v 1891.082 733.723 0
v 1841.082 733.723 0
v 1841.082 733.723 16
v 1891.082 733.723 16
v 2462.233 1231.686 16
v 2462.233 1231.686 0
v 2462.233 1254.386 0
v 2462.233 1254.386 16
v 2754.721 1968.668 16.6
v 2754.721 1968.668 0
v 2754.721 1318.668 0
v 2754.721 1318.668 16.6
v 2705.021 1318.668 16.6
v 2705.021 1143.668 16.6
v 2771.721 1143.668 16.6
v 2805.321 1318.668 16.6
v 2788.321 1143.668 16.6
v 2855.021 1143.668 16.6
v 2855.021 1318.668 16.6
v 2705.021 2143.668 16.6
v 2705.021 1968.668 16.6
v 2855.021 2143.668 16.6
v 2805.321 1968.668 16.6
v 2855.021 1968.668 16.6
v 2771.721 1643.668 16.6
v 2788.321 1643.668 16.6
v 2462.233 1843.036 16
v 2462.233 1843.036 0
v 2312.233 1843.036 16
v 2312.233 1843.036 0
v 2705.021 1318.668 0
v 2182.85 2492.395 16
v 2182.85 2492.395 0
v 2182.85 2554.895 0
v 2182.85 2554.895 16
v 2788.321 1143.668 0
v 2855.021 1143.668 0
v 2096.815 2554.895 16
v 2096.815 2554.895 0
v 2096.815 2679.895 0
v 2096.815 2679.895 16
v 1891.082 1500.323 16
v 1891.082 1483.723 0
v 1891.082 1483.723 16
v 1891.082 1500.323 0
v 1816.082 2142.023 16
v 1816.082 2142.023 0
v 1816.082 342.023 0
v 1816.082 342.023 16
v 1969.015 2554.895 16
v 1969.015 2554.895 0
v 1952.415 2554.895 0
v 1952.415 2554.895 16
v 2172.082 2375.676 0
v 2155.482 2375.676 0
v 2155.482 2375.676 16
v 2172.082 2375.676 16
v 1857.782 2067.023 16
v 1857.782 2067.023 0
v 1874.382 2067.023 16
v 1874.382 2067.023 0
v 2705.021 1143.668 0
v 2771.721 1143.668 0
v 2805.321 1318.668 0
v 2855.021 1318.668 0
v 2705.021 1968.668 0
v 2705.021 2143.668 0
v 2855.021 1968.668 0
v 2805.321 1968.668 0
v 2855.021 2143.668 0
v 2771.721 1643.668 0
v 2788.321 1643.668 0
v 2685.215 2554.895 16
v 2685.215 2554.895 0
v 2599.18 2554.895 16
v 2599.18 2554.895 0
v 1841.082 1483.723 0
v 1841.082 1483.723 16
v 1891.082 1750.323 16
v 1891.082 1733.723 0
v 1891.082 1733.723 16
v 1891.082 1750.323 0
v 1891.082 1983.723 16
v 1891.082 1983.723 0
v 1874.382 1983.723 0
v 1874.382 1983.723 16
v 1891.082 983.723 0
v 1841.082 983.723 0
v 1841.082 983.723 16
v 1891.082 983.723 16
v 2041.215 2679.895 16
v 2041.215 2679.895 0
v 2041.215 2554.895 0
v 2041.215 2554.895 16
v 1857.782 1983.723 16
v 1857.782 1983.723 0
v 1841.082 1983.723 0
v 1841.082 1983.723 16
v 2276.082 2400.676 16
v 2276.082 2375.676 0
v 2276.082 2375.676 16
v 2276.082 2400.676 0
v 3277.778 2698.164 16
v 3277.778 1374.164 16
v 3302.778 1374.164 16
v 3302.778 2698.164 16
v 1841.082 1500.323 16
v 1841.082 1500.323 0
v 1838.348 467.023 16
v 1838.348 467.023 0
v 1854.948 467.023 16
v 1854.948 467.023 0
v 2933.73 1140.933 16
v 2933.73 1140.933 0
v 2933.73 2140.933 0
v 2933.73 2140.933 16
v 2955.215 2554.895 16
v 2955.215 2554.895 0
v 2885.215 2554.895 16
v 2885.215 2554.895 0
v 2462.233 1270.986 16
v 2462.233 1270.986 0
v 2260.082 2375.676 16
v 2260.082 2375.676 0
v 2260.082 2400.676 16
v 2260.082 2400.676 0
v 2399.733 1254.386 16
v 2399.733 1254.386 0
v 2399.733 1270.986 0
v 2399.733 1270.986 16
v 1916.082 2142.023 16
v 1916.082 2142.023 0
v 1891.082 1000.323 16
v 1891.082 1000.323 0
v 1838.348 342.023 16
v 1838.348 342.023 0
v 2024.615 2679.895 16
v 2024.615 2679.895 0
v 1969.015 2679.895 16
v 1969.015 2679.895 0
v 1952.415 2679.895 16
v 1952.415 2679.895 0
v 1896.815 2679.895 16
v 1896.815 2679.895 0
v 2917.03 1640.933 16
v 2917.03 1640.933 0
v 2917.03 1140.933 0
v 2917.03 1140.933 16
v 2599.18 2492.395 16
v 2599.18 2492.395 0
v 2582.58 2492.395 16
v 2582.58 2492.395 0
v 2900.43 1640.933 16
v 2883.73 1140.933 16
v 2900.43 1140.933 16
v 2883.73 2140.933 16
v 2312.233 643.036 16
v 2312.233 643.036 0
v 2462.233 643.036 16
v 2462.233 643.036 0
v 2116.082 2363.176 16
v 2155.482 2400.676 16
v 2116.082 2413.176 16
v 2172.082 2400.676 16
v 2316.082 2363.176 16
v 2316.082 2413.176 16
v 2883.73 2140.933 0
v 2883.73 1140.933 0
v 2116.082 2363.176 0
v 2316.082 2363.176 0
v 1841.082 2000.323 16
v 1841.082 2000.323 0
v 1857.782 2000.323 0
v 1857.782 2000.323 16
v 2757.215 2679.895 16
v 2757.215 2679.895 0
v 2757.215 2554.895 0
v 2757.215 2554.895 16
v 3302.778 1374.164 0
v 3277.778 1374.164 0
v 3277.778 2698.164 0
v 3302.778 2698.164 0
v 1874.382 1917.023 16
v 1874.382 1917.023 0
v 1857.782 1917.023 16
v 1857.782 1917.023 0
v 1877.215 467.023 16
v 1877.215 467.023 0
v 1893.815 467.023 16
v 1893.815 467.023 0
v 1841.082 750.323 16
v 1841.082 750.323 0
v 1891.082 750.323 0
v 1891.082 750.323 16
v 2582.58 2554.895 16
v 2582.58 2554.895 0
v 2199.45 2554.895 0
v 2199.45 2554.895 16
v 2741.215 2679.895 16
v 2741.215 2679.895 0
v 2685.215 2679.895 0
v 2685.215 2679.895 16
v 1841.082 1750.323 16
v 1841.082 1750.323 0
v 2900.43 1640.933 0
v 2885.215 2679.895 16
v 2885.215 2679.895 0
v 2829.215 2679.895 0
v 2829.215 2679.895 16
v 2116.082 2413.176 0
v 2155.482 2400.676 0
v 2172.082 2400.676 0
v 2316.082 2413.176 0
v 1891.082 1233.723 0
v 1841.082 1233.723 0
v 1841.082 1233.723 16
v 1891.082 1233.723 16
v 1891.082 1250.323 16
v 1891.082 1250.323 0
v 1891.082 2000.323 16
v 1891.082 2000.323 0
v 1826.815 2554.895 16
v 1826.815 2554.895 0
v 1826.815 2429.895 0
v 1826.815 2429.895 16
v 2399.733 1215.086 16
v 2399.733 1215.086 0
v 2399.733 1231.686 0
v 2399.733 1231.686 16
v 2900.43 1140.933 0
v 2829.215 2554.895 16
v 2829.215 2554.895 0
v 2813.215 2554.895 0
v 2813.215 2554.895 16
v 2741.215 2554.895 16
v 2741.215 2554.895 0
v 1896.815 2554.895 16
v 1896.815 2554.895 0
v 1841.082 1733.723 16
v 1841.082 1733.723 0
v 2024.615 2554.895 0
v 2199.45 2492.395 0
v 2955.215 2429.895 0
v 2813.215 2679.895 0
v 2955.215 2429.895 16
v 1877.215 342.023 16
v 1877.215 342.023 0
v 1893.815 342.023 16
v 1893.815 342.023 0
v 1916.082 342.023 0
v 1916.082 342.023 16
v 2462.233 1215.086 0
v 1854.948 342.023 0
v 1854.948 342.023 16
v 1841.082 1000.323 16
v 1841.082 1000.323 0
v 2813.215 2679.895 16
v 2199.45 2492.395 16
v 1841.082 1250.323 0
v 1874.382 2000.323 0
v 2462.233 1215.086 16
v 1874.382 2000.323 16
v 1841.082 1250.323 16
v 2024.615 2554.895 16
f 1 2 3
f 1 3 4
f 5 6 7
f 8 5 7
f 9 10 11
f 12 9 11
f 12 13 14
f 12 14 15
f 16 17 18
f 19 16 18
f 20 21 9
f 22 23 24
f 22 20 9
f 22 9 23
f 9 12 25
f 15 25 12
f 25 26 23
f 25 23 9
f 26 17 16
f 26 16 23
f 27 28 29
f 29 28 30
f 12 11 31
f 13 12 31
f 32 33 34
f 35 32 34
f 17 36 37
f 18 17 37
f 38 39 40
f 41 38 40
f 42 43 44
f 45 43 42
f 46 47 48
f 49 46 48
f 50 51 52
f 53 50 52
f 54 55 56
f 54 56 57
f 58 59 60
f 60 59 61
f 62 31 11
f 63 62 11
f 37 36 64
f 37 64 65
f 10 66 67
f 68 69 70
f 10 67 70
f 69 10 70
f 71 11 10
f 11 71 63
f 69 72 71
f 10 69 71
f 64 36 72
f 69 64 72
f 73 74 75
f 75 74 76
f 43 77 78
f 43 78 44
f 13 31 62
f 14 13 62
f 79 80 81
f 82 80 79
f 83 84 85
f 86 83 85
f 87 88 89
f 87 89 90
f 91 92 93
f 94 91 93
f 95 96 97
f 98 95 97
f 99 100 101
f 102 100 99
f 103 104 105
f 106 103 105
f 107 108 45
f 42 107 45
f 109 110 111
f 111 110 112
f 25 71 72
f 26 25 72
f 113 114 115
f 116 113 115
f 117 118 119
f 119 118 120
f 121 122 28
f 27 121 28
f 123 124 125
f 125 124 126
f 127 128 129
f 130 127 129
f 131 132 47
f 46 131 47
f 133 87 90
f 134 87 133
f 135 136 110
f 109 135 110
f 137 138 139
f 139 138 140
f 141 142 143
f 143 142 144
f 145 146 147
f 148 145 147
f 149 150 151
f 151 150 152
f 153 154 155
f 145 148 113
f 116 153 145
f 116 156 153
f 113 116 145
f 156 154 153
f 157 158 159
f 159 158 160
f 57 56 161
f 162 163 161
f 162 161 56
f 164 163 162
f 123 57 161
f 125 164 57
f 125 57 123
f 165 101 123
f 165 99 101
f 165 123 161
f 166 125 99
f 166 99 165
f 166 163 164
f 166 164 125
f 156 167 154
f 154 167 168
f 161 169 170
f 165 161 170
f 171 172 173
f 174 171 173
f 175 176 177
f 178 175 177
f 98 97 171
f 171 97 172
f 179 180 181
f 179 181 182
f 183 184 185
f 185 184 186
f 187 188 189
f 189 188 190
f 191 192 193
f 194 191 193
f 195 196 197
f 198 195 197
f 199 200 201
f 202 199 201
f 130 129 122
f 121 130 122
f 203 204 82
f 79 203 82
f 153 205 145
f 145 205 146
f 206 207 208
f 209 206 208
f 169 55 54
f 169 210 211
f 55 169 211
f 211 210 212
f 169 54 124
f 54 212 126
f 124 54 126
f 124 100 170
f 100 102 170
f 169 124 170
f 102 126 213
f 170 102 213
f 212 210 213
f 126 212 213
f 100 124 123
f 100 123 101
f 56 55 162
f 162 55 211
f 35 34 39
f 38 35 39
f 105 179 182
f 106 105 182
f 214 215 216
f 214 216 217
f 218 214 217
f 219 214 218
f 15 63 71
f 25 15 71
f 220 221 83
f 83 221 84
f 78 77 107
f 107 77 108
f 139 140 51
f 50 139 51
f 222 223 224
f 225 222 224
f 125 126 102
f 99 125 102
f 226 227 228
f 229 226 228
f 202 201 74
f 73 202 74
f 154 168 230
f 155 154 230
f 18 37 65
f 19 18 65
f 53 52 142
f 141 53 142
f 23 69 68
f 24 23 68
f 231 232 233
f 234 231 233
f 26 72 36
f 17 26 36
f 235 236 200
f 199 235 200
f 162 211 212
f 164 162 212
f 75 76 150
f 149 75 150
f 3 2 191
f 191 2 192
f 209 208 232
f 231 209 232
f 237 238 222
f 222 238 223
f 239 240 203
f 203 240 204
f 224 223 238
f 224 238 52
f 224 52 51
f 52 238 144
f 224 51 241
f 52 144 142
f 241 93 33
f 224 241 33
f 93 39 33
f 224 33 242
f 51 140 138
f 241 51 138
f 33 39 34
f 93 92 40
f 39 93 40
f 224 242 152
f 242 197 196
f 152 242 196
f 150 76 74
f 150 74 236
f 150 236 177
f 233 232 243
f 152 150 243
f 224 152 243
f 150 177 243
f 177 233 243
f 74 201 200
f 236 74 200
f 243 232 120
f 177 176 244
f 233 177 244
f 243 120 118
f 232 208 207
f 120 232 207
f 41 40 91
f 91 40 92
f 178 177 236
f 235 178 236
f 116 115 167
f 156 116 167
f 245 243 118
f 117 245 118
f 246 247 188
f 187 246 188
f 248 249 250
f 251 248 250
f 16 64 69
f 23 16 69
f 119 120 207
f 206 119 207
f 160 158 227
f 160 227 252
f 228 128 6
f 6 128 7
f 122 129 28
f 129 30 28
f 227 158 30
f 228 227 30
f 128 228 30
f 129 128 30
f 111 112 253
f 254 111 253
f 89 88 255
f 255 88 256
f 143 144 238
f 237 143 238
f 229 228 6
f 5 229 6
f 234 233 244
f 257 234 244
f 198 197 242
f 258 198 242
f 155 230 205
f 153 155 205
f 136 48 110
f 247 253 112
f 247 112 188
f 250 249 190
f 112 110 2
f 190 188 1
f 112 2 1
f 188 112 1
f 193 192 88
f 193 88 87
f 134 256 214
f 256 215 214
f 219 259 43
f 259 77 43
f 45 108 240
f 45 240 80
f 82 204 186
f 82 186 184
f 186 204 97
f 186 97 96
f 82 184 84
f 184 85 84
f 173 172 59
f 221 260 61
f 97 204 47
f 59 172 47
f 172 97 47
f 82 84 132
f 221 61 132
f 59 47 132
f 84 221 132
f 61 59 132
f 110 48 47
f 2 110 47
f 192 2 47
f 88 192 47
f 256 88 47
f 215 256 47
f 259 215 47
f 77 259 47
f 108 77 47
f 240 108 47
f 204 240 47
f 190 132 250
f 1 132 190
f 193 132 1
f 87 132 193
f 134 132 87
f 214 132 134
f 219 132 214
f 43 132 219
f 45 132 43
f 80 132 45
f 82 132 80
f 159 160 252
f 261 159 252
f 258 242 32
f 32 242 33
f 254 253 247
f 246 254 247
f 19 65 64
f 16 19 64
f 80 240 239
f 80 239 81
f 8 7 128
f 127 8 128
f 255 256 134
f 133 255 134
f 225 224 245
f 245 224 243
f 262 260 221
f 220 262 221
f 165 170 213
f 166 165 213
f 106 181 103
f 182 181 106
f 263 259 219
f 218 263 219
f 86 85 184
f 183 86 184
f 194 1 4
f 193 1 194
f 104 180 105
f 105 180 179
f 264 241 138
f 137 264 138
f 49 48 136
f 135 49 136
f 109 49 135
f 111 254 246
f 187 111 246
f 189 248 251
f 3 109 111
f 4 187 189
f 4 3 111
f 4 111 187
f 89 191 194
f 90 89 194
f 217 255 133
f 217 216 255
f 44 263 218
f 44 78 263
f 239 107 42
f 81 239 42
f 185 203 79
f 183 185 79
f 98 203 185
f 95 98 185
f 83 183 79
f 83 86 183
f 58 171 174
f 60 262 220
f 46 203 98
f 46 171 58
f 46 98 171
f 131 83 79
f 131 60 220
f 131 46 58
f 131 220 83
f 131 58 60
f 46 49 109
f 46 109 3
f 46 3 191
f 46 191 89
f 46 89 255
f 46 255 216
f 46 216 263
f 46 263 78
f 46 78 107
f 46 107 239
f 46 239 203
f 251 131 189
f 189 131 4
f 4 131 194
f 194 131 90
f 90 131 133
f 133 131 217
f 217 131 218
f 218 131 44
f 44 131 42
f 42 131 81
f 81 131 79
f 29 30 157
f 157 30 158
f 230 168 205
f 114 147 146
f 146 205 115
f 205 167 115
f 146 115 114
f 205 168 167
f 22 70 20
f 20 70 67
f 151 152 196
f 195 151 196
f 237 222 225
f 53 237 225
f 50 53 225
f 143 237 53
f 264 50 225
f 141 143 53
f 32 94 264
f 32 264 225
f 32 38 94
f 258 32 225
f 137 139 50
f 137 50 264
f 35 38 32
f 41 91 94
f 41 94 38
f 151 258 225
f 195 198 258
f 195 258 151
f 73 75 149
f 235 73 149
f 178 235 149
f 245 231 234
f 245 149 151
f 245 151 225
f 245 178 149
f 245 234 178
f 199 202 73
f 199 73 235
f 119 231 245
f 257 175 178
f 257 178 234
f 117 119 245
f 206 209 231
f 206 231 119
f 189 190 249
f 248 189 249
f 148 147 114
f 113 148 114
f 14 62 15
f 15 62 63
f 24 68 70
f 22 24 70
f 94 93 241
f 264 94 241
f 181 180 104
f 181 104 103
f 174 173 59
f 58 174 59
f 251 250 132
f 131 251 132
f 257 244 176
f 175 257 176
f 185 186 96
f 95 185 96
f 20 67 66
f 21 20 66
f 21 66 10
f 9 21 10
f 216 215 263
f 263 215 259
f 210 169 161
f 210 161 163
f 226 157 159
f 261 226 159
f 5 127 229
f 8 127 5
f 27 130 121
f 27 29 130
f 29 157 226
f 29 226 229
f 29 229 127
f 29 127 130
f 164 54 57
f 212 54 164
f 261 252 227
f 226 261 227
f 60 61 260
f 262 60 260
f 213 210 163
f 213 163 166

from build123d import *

# Parameters (mm, degrees)
F2_DEPTH = 16
F1_W     = 200
F1_H     = 50
F1_W_2   = 16.6
F1_H_2   = 25
F1_W_3   = 16
F1_W_4   = 50
F1_H_3   = 16.6
F3_DEPTH = 16.6
F1_W_5   = 25
F1_H_4   = 1324
F4_DEPTH = 16


# Not quite as in the source:
# - a feature names something its author has since deleted; it is built from what else it names


with BuildPart() as f2:
    # F1 (on Top) → F2 (new body)
    with BuildSketch(Plane.XY):
        Polygon((1826.8150956472, 2554.895401001), (1826.8150956472, 2429.895401001), (2955.2150956472, 2429.895401001), (2955.2150956472, 2554.895401001), (2885.2150956472, 2554.895401001), (2885.2150956472, 2679.895401001), (2829.2150956472, 2679.895401001), (2829.2150956472, 2554.895401001), (2813.2150956472, 2554.895401001), (2813.2150956472, 2679.895401001), (2757.2150956472, 2679.895401001), (2757.2150956472, 2554.895401001), (2741.2150956472, 2554.895401001), (2741.2150956472, 2679.895401001), (2685.2150956472, 2679.895401001), (2685.2150956472, 2554.895401001), (2599.1797067006, 2554.895401001), (2599.1797067006, 2492.395401001), (2582.5797067006, 2492.395401001), (2582.5797067006, 2554.895401001), (2199.4504845937, 2554.895401001), (2199.4504845937, 2492.395401001), (2182.8504845937, 2492.395401001), (2182.8504845937, 2554.895401001), (2096.8150956472, 2554.895401001), (2096.8150956472, 2679.895401001), (2041.2150956472, 2679.895401001), (2041.2150956472, 2554.895401001), (2024.6150956472, 2554.895401001), (2024.6150956472, 2679.895401001), (1969.0150956472, 2679.895401001), (1969.0150956472, 2554.895401001), (1952.4150956472, 2554.895401001), (1952.4150956472, 2679.895401001), (1896.8150956472, 2679.895401001), (1896.8150956472, 2554.895401001), align=None)
    extrude(amount=F2_DEPTH)


with BuildPart() as f2b:
    # F1 (on Top) → F2, piece 2 (new body)
    with BuildSketch(Plane.XY):
        with Locations((2216.0817146301, 2388.1756305695)):
            Rectangle(F1_W, F1_H)
        with Locations((2163.7817146301, 2388.1756305695)):
            Rectangle(F1_W_2, F1_H_2, mode=Mode.SUBTRACT)
        with Locations((2268.0817146301, 2388.1756305695)):
            Rectangle(F1_W_3, F1_H_2, mode=Mode.SUBTRACT)
    extrude(amount=F2_DEPTH)


with BuildPart() as f2c:
    # F1 (on Top) → F2, piece 3 (new body)
    with BuildSketch(Plane.XY):
        Polygon((2917.0303050995, 1140.9330368042), (2933.7303050995, 1140.9330368042), (2933.7303050995, 2140.9330368042), (2883.7303050995, 2140.9330368042), (2883.7303050995, 1140.9330368042), (2900.4303050995, 1140.9330368042), (2900.4303050995, 1640.9330368042), (2917.0303050995, 1640.9330368042), align=None)
    extrude(amount=F2_DEPTH)


with BuildPart() as f2d:
    # F1 (on Top) → F2, piece 4 (new body)
    with BuildSketch(Plane.XY):
        Polygon((1916.0817667643, 2142.0231616099), (1816.0817667643, 2142.0231616099), (1816.0817667643, 342.0231616099), (1838.348433431, 342.0231616099), (1838.348433431, 467.0231616099), (1854.948433431, 467.0231616099), (1854.948433431, 342.0231616099), (1877.2151000977, 342.0231616099), (1877.2151000977, 467.0231616099), (1893.8151000977, 467.0231616099), (1893.8151000977, 342.0231616099), (1916.0817667643, 342.0231616099), align=None)
        with Locations((1866.0817667643, 742.0231616099)):
            Rectangle(F1_W_4, F1_H_3, mode=Mode.SUBTRACT)
        with Locations((1866.0817667643, 992.0231616099)):
            Rectangle(F1_W_4, F1_H_3, mode=Mode.SUBTRACT)
        with Locations((1866.0817667643, 1242.0231616099)):
            Rectangle(F1_W_4, F1_H_3, mode=Mode.SUBTRACT)
        with Locations((1866.0817667643, 1492.0231616099)):
            Rectangle(F1_W_4, F1_H_3, mode=Mode.SUBTRACT)
        with Locations((1866.0817667643, 1742.0231616099)):
            Rectangle(F1_W_4, F1_H_3, mode=Mode.SUBTRACT)
        Polygon((1874.3817667643, 2000.3231616099), (1891.0817667643, 2000.3231616099), (1891.0817667643, 1983.7231616099), (1874.3817667643, 1983.7231616099), (1874.3817667643, 1917.0231616099), (1857.7817667643, 1917.0231616099), (1857.7817667643, 1983.7231616099), (1841.0817667643, 1983.7231616099), (1841.0817667643, 2000.3231616099), (1857.7817667643, 2000.3231616099), (1857.7817667643, 2067.0231616099), (1874.3817667643, 2067.0231616099), align=None, mode=Mode.SUBTRACT)
    extrude(amount=F2_DEPTH)


with BuildPart() as f2e:
    # F1 (on Top) → F2, piece 5 (new body)
    with BuildSketch(Plane.XY):
        Polygon((2312.2333049774, 1843.0356502533), (2312.2333049774, 643.0356502533), (2462.2333049774, 643.0356502533), (2462.2333049774, 1215.0856502533), (2399.7333049774, 1215.0856502533), (2399.7333049774, 1231.6856502533), (2462.2333049774, 1231.6856502533), (2462.2333049774, 1254.3856502533), (2399.7333049774, 1254.3856502533), (2399.7333049774, 1270.9856502533), (2462.2333049774, 1270.9856502533), (2462.2333049774, 1843.0356502533), align=None)
    extrude(amount=F2_DEPTH)


with BuildPart() as f3:
    # F1 (on Top) → F3 (new body)
    with BuildSketch(Plane.XY):
        Polygon((2855.0214290619, 1968.6681032181), (2855.0214290619, 2143.6681032181), (2705.0214290619, 2143.6681032181), (2705.0214290619, 1968.6681032181), (2754.7214290619, 1968.6681032181), (2754.7214290619, 1318.6681032181), (2705.0214290619, 1318.6681032181), (2705.0214290619, 1143.6681032181), (2771.7214290619, 1143.6681032181), (2771.7214290619, 1643.6681032181), (2788.3214290619, 1643.6681032181), (2788.3214290619, 1143.6681032181), (2855.0214290619, 1143.6681032181), (2855.0214290619, 1318.6681032181), (2805.3214290619, 1318.6681032181), (2805.3214290619, 1968.6681032181), align=None)
    extrude(amount=F3_DEPTH)


with BuildPart() as f4:
    # F1 (on Top) → F4 (new body)
    with BuildSketch(Plane.XY):
        with Locations((3290.2781486511, 2036.1644620895)):
            Rectangle(F1_W_5, F1_H_4)
    extrude(amount=F4_DEPTH)


solid = Compound([f2.part, f2b.part, f2c.part, f2d.part, f2e.part, f3.part, f4.part])
